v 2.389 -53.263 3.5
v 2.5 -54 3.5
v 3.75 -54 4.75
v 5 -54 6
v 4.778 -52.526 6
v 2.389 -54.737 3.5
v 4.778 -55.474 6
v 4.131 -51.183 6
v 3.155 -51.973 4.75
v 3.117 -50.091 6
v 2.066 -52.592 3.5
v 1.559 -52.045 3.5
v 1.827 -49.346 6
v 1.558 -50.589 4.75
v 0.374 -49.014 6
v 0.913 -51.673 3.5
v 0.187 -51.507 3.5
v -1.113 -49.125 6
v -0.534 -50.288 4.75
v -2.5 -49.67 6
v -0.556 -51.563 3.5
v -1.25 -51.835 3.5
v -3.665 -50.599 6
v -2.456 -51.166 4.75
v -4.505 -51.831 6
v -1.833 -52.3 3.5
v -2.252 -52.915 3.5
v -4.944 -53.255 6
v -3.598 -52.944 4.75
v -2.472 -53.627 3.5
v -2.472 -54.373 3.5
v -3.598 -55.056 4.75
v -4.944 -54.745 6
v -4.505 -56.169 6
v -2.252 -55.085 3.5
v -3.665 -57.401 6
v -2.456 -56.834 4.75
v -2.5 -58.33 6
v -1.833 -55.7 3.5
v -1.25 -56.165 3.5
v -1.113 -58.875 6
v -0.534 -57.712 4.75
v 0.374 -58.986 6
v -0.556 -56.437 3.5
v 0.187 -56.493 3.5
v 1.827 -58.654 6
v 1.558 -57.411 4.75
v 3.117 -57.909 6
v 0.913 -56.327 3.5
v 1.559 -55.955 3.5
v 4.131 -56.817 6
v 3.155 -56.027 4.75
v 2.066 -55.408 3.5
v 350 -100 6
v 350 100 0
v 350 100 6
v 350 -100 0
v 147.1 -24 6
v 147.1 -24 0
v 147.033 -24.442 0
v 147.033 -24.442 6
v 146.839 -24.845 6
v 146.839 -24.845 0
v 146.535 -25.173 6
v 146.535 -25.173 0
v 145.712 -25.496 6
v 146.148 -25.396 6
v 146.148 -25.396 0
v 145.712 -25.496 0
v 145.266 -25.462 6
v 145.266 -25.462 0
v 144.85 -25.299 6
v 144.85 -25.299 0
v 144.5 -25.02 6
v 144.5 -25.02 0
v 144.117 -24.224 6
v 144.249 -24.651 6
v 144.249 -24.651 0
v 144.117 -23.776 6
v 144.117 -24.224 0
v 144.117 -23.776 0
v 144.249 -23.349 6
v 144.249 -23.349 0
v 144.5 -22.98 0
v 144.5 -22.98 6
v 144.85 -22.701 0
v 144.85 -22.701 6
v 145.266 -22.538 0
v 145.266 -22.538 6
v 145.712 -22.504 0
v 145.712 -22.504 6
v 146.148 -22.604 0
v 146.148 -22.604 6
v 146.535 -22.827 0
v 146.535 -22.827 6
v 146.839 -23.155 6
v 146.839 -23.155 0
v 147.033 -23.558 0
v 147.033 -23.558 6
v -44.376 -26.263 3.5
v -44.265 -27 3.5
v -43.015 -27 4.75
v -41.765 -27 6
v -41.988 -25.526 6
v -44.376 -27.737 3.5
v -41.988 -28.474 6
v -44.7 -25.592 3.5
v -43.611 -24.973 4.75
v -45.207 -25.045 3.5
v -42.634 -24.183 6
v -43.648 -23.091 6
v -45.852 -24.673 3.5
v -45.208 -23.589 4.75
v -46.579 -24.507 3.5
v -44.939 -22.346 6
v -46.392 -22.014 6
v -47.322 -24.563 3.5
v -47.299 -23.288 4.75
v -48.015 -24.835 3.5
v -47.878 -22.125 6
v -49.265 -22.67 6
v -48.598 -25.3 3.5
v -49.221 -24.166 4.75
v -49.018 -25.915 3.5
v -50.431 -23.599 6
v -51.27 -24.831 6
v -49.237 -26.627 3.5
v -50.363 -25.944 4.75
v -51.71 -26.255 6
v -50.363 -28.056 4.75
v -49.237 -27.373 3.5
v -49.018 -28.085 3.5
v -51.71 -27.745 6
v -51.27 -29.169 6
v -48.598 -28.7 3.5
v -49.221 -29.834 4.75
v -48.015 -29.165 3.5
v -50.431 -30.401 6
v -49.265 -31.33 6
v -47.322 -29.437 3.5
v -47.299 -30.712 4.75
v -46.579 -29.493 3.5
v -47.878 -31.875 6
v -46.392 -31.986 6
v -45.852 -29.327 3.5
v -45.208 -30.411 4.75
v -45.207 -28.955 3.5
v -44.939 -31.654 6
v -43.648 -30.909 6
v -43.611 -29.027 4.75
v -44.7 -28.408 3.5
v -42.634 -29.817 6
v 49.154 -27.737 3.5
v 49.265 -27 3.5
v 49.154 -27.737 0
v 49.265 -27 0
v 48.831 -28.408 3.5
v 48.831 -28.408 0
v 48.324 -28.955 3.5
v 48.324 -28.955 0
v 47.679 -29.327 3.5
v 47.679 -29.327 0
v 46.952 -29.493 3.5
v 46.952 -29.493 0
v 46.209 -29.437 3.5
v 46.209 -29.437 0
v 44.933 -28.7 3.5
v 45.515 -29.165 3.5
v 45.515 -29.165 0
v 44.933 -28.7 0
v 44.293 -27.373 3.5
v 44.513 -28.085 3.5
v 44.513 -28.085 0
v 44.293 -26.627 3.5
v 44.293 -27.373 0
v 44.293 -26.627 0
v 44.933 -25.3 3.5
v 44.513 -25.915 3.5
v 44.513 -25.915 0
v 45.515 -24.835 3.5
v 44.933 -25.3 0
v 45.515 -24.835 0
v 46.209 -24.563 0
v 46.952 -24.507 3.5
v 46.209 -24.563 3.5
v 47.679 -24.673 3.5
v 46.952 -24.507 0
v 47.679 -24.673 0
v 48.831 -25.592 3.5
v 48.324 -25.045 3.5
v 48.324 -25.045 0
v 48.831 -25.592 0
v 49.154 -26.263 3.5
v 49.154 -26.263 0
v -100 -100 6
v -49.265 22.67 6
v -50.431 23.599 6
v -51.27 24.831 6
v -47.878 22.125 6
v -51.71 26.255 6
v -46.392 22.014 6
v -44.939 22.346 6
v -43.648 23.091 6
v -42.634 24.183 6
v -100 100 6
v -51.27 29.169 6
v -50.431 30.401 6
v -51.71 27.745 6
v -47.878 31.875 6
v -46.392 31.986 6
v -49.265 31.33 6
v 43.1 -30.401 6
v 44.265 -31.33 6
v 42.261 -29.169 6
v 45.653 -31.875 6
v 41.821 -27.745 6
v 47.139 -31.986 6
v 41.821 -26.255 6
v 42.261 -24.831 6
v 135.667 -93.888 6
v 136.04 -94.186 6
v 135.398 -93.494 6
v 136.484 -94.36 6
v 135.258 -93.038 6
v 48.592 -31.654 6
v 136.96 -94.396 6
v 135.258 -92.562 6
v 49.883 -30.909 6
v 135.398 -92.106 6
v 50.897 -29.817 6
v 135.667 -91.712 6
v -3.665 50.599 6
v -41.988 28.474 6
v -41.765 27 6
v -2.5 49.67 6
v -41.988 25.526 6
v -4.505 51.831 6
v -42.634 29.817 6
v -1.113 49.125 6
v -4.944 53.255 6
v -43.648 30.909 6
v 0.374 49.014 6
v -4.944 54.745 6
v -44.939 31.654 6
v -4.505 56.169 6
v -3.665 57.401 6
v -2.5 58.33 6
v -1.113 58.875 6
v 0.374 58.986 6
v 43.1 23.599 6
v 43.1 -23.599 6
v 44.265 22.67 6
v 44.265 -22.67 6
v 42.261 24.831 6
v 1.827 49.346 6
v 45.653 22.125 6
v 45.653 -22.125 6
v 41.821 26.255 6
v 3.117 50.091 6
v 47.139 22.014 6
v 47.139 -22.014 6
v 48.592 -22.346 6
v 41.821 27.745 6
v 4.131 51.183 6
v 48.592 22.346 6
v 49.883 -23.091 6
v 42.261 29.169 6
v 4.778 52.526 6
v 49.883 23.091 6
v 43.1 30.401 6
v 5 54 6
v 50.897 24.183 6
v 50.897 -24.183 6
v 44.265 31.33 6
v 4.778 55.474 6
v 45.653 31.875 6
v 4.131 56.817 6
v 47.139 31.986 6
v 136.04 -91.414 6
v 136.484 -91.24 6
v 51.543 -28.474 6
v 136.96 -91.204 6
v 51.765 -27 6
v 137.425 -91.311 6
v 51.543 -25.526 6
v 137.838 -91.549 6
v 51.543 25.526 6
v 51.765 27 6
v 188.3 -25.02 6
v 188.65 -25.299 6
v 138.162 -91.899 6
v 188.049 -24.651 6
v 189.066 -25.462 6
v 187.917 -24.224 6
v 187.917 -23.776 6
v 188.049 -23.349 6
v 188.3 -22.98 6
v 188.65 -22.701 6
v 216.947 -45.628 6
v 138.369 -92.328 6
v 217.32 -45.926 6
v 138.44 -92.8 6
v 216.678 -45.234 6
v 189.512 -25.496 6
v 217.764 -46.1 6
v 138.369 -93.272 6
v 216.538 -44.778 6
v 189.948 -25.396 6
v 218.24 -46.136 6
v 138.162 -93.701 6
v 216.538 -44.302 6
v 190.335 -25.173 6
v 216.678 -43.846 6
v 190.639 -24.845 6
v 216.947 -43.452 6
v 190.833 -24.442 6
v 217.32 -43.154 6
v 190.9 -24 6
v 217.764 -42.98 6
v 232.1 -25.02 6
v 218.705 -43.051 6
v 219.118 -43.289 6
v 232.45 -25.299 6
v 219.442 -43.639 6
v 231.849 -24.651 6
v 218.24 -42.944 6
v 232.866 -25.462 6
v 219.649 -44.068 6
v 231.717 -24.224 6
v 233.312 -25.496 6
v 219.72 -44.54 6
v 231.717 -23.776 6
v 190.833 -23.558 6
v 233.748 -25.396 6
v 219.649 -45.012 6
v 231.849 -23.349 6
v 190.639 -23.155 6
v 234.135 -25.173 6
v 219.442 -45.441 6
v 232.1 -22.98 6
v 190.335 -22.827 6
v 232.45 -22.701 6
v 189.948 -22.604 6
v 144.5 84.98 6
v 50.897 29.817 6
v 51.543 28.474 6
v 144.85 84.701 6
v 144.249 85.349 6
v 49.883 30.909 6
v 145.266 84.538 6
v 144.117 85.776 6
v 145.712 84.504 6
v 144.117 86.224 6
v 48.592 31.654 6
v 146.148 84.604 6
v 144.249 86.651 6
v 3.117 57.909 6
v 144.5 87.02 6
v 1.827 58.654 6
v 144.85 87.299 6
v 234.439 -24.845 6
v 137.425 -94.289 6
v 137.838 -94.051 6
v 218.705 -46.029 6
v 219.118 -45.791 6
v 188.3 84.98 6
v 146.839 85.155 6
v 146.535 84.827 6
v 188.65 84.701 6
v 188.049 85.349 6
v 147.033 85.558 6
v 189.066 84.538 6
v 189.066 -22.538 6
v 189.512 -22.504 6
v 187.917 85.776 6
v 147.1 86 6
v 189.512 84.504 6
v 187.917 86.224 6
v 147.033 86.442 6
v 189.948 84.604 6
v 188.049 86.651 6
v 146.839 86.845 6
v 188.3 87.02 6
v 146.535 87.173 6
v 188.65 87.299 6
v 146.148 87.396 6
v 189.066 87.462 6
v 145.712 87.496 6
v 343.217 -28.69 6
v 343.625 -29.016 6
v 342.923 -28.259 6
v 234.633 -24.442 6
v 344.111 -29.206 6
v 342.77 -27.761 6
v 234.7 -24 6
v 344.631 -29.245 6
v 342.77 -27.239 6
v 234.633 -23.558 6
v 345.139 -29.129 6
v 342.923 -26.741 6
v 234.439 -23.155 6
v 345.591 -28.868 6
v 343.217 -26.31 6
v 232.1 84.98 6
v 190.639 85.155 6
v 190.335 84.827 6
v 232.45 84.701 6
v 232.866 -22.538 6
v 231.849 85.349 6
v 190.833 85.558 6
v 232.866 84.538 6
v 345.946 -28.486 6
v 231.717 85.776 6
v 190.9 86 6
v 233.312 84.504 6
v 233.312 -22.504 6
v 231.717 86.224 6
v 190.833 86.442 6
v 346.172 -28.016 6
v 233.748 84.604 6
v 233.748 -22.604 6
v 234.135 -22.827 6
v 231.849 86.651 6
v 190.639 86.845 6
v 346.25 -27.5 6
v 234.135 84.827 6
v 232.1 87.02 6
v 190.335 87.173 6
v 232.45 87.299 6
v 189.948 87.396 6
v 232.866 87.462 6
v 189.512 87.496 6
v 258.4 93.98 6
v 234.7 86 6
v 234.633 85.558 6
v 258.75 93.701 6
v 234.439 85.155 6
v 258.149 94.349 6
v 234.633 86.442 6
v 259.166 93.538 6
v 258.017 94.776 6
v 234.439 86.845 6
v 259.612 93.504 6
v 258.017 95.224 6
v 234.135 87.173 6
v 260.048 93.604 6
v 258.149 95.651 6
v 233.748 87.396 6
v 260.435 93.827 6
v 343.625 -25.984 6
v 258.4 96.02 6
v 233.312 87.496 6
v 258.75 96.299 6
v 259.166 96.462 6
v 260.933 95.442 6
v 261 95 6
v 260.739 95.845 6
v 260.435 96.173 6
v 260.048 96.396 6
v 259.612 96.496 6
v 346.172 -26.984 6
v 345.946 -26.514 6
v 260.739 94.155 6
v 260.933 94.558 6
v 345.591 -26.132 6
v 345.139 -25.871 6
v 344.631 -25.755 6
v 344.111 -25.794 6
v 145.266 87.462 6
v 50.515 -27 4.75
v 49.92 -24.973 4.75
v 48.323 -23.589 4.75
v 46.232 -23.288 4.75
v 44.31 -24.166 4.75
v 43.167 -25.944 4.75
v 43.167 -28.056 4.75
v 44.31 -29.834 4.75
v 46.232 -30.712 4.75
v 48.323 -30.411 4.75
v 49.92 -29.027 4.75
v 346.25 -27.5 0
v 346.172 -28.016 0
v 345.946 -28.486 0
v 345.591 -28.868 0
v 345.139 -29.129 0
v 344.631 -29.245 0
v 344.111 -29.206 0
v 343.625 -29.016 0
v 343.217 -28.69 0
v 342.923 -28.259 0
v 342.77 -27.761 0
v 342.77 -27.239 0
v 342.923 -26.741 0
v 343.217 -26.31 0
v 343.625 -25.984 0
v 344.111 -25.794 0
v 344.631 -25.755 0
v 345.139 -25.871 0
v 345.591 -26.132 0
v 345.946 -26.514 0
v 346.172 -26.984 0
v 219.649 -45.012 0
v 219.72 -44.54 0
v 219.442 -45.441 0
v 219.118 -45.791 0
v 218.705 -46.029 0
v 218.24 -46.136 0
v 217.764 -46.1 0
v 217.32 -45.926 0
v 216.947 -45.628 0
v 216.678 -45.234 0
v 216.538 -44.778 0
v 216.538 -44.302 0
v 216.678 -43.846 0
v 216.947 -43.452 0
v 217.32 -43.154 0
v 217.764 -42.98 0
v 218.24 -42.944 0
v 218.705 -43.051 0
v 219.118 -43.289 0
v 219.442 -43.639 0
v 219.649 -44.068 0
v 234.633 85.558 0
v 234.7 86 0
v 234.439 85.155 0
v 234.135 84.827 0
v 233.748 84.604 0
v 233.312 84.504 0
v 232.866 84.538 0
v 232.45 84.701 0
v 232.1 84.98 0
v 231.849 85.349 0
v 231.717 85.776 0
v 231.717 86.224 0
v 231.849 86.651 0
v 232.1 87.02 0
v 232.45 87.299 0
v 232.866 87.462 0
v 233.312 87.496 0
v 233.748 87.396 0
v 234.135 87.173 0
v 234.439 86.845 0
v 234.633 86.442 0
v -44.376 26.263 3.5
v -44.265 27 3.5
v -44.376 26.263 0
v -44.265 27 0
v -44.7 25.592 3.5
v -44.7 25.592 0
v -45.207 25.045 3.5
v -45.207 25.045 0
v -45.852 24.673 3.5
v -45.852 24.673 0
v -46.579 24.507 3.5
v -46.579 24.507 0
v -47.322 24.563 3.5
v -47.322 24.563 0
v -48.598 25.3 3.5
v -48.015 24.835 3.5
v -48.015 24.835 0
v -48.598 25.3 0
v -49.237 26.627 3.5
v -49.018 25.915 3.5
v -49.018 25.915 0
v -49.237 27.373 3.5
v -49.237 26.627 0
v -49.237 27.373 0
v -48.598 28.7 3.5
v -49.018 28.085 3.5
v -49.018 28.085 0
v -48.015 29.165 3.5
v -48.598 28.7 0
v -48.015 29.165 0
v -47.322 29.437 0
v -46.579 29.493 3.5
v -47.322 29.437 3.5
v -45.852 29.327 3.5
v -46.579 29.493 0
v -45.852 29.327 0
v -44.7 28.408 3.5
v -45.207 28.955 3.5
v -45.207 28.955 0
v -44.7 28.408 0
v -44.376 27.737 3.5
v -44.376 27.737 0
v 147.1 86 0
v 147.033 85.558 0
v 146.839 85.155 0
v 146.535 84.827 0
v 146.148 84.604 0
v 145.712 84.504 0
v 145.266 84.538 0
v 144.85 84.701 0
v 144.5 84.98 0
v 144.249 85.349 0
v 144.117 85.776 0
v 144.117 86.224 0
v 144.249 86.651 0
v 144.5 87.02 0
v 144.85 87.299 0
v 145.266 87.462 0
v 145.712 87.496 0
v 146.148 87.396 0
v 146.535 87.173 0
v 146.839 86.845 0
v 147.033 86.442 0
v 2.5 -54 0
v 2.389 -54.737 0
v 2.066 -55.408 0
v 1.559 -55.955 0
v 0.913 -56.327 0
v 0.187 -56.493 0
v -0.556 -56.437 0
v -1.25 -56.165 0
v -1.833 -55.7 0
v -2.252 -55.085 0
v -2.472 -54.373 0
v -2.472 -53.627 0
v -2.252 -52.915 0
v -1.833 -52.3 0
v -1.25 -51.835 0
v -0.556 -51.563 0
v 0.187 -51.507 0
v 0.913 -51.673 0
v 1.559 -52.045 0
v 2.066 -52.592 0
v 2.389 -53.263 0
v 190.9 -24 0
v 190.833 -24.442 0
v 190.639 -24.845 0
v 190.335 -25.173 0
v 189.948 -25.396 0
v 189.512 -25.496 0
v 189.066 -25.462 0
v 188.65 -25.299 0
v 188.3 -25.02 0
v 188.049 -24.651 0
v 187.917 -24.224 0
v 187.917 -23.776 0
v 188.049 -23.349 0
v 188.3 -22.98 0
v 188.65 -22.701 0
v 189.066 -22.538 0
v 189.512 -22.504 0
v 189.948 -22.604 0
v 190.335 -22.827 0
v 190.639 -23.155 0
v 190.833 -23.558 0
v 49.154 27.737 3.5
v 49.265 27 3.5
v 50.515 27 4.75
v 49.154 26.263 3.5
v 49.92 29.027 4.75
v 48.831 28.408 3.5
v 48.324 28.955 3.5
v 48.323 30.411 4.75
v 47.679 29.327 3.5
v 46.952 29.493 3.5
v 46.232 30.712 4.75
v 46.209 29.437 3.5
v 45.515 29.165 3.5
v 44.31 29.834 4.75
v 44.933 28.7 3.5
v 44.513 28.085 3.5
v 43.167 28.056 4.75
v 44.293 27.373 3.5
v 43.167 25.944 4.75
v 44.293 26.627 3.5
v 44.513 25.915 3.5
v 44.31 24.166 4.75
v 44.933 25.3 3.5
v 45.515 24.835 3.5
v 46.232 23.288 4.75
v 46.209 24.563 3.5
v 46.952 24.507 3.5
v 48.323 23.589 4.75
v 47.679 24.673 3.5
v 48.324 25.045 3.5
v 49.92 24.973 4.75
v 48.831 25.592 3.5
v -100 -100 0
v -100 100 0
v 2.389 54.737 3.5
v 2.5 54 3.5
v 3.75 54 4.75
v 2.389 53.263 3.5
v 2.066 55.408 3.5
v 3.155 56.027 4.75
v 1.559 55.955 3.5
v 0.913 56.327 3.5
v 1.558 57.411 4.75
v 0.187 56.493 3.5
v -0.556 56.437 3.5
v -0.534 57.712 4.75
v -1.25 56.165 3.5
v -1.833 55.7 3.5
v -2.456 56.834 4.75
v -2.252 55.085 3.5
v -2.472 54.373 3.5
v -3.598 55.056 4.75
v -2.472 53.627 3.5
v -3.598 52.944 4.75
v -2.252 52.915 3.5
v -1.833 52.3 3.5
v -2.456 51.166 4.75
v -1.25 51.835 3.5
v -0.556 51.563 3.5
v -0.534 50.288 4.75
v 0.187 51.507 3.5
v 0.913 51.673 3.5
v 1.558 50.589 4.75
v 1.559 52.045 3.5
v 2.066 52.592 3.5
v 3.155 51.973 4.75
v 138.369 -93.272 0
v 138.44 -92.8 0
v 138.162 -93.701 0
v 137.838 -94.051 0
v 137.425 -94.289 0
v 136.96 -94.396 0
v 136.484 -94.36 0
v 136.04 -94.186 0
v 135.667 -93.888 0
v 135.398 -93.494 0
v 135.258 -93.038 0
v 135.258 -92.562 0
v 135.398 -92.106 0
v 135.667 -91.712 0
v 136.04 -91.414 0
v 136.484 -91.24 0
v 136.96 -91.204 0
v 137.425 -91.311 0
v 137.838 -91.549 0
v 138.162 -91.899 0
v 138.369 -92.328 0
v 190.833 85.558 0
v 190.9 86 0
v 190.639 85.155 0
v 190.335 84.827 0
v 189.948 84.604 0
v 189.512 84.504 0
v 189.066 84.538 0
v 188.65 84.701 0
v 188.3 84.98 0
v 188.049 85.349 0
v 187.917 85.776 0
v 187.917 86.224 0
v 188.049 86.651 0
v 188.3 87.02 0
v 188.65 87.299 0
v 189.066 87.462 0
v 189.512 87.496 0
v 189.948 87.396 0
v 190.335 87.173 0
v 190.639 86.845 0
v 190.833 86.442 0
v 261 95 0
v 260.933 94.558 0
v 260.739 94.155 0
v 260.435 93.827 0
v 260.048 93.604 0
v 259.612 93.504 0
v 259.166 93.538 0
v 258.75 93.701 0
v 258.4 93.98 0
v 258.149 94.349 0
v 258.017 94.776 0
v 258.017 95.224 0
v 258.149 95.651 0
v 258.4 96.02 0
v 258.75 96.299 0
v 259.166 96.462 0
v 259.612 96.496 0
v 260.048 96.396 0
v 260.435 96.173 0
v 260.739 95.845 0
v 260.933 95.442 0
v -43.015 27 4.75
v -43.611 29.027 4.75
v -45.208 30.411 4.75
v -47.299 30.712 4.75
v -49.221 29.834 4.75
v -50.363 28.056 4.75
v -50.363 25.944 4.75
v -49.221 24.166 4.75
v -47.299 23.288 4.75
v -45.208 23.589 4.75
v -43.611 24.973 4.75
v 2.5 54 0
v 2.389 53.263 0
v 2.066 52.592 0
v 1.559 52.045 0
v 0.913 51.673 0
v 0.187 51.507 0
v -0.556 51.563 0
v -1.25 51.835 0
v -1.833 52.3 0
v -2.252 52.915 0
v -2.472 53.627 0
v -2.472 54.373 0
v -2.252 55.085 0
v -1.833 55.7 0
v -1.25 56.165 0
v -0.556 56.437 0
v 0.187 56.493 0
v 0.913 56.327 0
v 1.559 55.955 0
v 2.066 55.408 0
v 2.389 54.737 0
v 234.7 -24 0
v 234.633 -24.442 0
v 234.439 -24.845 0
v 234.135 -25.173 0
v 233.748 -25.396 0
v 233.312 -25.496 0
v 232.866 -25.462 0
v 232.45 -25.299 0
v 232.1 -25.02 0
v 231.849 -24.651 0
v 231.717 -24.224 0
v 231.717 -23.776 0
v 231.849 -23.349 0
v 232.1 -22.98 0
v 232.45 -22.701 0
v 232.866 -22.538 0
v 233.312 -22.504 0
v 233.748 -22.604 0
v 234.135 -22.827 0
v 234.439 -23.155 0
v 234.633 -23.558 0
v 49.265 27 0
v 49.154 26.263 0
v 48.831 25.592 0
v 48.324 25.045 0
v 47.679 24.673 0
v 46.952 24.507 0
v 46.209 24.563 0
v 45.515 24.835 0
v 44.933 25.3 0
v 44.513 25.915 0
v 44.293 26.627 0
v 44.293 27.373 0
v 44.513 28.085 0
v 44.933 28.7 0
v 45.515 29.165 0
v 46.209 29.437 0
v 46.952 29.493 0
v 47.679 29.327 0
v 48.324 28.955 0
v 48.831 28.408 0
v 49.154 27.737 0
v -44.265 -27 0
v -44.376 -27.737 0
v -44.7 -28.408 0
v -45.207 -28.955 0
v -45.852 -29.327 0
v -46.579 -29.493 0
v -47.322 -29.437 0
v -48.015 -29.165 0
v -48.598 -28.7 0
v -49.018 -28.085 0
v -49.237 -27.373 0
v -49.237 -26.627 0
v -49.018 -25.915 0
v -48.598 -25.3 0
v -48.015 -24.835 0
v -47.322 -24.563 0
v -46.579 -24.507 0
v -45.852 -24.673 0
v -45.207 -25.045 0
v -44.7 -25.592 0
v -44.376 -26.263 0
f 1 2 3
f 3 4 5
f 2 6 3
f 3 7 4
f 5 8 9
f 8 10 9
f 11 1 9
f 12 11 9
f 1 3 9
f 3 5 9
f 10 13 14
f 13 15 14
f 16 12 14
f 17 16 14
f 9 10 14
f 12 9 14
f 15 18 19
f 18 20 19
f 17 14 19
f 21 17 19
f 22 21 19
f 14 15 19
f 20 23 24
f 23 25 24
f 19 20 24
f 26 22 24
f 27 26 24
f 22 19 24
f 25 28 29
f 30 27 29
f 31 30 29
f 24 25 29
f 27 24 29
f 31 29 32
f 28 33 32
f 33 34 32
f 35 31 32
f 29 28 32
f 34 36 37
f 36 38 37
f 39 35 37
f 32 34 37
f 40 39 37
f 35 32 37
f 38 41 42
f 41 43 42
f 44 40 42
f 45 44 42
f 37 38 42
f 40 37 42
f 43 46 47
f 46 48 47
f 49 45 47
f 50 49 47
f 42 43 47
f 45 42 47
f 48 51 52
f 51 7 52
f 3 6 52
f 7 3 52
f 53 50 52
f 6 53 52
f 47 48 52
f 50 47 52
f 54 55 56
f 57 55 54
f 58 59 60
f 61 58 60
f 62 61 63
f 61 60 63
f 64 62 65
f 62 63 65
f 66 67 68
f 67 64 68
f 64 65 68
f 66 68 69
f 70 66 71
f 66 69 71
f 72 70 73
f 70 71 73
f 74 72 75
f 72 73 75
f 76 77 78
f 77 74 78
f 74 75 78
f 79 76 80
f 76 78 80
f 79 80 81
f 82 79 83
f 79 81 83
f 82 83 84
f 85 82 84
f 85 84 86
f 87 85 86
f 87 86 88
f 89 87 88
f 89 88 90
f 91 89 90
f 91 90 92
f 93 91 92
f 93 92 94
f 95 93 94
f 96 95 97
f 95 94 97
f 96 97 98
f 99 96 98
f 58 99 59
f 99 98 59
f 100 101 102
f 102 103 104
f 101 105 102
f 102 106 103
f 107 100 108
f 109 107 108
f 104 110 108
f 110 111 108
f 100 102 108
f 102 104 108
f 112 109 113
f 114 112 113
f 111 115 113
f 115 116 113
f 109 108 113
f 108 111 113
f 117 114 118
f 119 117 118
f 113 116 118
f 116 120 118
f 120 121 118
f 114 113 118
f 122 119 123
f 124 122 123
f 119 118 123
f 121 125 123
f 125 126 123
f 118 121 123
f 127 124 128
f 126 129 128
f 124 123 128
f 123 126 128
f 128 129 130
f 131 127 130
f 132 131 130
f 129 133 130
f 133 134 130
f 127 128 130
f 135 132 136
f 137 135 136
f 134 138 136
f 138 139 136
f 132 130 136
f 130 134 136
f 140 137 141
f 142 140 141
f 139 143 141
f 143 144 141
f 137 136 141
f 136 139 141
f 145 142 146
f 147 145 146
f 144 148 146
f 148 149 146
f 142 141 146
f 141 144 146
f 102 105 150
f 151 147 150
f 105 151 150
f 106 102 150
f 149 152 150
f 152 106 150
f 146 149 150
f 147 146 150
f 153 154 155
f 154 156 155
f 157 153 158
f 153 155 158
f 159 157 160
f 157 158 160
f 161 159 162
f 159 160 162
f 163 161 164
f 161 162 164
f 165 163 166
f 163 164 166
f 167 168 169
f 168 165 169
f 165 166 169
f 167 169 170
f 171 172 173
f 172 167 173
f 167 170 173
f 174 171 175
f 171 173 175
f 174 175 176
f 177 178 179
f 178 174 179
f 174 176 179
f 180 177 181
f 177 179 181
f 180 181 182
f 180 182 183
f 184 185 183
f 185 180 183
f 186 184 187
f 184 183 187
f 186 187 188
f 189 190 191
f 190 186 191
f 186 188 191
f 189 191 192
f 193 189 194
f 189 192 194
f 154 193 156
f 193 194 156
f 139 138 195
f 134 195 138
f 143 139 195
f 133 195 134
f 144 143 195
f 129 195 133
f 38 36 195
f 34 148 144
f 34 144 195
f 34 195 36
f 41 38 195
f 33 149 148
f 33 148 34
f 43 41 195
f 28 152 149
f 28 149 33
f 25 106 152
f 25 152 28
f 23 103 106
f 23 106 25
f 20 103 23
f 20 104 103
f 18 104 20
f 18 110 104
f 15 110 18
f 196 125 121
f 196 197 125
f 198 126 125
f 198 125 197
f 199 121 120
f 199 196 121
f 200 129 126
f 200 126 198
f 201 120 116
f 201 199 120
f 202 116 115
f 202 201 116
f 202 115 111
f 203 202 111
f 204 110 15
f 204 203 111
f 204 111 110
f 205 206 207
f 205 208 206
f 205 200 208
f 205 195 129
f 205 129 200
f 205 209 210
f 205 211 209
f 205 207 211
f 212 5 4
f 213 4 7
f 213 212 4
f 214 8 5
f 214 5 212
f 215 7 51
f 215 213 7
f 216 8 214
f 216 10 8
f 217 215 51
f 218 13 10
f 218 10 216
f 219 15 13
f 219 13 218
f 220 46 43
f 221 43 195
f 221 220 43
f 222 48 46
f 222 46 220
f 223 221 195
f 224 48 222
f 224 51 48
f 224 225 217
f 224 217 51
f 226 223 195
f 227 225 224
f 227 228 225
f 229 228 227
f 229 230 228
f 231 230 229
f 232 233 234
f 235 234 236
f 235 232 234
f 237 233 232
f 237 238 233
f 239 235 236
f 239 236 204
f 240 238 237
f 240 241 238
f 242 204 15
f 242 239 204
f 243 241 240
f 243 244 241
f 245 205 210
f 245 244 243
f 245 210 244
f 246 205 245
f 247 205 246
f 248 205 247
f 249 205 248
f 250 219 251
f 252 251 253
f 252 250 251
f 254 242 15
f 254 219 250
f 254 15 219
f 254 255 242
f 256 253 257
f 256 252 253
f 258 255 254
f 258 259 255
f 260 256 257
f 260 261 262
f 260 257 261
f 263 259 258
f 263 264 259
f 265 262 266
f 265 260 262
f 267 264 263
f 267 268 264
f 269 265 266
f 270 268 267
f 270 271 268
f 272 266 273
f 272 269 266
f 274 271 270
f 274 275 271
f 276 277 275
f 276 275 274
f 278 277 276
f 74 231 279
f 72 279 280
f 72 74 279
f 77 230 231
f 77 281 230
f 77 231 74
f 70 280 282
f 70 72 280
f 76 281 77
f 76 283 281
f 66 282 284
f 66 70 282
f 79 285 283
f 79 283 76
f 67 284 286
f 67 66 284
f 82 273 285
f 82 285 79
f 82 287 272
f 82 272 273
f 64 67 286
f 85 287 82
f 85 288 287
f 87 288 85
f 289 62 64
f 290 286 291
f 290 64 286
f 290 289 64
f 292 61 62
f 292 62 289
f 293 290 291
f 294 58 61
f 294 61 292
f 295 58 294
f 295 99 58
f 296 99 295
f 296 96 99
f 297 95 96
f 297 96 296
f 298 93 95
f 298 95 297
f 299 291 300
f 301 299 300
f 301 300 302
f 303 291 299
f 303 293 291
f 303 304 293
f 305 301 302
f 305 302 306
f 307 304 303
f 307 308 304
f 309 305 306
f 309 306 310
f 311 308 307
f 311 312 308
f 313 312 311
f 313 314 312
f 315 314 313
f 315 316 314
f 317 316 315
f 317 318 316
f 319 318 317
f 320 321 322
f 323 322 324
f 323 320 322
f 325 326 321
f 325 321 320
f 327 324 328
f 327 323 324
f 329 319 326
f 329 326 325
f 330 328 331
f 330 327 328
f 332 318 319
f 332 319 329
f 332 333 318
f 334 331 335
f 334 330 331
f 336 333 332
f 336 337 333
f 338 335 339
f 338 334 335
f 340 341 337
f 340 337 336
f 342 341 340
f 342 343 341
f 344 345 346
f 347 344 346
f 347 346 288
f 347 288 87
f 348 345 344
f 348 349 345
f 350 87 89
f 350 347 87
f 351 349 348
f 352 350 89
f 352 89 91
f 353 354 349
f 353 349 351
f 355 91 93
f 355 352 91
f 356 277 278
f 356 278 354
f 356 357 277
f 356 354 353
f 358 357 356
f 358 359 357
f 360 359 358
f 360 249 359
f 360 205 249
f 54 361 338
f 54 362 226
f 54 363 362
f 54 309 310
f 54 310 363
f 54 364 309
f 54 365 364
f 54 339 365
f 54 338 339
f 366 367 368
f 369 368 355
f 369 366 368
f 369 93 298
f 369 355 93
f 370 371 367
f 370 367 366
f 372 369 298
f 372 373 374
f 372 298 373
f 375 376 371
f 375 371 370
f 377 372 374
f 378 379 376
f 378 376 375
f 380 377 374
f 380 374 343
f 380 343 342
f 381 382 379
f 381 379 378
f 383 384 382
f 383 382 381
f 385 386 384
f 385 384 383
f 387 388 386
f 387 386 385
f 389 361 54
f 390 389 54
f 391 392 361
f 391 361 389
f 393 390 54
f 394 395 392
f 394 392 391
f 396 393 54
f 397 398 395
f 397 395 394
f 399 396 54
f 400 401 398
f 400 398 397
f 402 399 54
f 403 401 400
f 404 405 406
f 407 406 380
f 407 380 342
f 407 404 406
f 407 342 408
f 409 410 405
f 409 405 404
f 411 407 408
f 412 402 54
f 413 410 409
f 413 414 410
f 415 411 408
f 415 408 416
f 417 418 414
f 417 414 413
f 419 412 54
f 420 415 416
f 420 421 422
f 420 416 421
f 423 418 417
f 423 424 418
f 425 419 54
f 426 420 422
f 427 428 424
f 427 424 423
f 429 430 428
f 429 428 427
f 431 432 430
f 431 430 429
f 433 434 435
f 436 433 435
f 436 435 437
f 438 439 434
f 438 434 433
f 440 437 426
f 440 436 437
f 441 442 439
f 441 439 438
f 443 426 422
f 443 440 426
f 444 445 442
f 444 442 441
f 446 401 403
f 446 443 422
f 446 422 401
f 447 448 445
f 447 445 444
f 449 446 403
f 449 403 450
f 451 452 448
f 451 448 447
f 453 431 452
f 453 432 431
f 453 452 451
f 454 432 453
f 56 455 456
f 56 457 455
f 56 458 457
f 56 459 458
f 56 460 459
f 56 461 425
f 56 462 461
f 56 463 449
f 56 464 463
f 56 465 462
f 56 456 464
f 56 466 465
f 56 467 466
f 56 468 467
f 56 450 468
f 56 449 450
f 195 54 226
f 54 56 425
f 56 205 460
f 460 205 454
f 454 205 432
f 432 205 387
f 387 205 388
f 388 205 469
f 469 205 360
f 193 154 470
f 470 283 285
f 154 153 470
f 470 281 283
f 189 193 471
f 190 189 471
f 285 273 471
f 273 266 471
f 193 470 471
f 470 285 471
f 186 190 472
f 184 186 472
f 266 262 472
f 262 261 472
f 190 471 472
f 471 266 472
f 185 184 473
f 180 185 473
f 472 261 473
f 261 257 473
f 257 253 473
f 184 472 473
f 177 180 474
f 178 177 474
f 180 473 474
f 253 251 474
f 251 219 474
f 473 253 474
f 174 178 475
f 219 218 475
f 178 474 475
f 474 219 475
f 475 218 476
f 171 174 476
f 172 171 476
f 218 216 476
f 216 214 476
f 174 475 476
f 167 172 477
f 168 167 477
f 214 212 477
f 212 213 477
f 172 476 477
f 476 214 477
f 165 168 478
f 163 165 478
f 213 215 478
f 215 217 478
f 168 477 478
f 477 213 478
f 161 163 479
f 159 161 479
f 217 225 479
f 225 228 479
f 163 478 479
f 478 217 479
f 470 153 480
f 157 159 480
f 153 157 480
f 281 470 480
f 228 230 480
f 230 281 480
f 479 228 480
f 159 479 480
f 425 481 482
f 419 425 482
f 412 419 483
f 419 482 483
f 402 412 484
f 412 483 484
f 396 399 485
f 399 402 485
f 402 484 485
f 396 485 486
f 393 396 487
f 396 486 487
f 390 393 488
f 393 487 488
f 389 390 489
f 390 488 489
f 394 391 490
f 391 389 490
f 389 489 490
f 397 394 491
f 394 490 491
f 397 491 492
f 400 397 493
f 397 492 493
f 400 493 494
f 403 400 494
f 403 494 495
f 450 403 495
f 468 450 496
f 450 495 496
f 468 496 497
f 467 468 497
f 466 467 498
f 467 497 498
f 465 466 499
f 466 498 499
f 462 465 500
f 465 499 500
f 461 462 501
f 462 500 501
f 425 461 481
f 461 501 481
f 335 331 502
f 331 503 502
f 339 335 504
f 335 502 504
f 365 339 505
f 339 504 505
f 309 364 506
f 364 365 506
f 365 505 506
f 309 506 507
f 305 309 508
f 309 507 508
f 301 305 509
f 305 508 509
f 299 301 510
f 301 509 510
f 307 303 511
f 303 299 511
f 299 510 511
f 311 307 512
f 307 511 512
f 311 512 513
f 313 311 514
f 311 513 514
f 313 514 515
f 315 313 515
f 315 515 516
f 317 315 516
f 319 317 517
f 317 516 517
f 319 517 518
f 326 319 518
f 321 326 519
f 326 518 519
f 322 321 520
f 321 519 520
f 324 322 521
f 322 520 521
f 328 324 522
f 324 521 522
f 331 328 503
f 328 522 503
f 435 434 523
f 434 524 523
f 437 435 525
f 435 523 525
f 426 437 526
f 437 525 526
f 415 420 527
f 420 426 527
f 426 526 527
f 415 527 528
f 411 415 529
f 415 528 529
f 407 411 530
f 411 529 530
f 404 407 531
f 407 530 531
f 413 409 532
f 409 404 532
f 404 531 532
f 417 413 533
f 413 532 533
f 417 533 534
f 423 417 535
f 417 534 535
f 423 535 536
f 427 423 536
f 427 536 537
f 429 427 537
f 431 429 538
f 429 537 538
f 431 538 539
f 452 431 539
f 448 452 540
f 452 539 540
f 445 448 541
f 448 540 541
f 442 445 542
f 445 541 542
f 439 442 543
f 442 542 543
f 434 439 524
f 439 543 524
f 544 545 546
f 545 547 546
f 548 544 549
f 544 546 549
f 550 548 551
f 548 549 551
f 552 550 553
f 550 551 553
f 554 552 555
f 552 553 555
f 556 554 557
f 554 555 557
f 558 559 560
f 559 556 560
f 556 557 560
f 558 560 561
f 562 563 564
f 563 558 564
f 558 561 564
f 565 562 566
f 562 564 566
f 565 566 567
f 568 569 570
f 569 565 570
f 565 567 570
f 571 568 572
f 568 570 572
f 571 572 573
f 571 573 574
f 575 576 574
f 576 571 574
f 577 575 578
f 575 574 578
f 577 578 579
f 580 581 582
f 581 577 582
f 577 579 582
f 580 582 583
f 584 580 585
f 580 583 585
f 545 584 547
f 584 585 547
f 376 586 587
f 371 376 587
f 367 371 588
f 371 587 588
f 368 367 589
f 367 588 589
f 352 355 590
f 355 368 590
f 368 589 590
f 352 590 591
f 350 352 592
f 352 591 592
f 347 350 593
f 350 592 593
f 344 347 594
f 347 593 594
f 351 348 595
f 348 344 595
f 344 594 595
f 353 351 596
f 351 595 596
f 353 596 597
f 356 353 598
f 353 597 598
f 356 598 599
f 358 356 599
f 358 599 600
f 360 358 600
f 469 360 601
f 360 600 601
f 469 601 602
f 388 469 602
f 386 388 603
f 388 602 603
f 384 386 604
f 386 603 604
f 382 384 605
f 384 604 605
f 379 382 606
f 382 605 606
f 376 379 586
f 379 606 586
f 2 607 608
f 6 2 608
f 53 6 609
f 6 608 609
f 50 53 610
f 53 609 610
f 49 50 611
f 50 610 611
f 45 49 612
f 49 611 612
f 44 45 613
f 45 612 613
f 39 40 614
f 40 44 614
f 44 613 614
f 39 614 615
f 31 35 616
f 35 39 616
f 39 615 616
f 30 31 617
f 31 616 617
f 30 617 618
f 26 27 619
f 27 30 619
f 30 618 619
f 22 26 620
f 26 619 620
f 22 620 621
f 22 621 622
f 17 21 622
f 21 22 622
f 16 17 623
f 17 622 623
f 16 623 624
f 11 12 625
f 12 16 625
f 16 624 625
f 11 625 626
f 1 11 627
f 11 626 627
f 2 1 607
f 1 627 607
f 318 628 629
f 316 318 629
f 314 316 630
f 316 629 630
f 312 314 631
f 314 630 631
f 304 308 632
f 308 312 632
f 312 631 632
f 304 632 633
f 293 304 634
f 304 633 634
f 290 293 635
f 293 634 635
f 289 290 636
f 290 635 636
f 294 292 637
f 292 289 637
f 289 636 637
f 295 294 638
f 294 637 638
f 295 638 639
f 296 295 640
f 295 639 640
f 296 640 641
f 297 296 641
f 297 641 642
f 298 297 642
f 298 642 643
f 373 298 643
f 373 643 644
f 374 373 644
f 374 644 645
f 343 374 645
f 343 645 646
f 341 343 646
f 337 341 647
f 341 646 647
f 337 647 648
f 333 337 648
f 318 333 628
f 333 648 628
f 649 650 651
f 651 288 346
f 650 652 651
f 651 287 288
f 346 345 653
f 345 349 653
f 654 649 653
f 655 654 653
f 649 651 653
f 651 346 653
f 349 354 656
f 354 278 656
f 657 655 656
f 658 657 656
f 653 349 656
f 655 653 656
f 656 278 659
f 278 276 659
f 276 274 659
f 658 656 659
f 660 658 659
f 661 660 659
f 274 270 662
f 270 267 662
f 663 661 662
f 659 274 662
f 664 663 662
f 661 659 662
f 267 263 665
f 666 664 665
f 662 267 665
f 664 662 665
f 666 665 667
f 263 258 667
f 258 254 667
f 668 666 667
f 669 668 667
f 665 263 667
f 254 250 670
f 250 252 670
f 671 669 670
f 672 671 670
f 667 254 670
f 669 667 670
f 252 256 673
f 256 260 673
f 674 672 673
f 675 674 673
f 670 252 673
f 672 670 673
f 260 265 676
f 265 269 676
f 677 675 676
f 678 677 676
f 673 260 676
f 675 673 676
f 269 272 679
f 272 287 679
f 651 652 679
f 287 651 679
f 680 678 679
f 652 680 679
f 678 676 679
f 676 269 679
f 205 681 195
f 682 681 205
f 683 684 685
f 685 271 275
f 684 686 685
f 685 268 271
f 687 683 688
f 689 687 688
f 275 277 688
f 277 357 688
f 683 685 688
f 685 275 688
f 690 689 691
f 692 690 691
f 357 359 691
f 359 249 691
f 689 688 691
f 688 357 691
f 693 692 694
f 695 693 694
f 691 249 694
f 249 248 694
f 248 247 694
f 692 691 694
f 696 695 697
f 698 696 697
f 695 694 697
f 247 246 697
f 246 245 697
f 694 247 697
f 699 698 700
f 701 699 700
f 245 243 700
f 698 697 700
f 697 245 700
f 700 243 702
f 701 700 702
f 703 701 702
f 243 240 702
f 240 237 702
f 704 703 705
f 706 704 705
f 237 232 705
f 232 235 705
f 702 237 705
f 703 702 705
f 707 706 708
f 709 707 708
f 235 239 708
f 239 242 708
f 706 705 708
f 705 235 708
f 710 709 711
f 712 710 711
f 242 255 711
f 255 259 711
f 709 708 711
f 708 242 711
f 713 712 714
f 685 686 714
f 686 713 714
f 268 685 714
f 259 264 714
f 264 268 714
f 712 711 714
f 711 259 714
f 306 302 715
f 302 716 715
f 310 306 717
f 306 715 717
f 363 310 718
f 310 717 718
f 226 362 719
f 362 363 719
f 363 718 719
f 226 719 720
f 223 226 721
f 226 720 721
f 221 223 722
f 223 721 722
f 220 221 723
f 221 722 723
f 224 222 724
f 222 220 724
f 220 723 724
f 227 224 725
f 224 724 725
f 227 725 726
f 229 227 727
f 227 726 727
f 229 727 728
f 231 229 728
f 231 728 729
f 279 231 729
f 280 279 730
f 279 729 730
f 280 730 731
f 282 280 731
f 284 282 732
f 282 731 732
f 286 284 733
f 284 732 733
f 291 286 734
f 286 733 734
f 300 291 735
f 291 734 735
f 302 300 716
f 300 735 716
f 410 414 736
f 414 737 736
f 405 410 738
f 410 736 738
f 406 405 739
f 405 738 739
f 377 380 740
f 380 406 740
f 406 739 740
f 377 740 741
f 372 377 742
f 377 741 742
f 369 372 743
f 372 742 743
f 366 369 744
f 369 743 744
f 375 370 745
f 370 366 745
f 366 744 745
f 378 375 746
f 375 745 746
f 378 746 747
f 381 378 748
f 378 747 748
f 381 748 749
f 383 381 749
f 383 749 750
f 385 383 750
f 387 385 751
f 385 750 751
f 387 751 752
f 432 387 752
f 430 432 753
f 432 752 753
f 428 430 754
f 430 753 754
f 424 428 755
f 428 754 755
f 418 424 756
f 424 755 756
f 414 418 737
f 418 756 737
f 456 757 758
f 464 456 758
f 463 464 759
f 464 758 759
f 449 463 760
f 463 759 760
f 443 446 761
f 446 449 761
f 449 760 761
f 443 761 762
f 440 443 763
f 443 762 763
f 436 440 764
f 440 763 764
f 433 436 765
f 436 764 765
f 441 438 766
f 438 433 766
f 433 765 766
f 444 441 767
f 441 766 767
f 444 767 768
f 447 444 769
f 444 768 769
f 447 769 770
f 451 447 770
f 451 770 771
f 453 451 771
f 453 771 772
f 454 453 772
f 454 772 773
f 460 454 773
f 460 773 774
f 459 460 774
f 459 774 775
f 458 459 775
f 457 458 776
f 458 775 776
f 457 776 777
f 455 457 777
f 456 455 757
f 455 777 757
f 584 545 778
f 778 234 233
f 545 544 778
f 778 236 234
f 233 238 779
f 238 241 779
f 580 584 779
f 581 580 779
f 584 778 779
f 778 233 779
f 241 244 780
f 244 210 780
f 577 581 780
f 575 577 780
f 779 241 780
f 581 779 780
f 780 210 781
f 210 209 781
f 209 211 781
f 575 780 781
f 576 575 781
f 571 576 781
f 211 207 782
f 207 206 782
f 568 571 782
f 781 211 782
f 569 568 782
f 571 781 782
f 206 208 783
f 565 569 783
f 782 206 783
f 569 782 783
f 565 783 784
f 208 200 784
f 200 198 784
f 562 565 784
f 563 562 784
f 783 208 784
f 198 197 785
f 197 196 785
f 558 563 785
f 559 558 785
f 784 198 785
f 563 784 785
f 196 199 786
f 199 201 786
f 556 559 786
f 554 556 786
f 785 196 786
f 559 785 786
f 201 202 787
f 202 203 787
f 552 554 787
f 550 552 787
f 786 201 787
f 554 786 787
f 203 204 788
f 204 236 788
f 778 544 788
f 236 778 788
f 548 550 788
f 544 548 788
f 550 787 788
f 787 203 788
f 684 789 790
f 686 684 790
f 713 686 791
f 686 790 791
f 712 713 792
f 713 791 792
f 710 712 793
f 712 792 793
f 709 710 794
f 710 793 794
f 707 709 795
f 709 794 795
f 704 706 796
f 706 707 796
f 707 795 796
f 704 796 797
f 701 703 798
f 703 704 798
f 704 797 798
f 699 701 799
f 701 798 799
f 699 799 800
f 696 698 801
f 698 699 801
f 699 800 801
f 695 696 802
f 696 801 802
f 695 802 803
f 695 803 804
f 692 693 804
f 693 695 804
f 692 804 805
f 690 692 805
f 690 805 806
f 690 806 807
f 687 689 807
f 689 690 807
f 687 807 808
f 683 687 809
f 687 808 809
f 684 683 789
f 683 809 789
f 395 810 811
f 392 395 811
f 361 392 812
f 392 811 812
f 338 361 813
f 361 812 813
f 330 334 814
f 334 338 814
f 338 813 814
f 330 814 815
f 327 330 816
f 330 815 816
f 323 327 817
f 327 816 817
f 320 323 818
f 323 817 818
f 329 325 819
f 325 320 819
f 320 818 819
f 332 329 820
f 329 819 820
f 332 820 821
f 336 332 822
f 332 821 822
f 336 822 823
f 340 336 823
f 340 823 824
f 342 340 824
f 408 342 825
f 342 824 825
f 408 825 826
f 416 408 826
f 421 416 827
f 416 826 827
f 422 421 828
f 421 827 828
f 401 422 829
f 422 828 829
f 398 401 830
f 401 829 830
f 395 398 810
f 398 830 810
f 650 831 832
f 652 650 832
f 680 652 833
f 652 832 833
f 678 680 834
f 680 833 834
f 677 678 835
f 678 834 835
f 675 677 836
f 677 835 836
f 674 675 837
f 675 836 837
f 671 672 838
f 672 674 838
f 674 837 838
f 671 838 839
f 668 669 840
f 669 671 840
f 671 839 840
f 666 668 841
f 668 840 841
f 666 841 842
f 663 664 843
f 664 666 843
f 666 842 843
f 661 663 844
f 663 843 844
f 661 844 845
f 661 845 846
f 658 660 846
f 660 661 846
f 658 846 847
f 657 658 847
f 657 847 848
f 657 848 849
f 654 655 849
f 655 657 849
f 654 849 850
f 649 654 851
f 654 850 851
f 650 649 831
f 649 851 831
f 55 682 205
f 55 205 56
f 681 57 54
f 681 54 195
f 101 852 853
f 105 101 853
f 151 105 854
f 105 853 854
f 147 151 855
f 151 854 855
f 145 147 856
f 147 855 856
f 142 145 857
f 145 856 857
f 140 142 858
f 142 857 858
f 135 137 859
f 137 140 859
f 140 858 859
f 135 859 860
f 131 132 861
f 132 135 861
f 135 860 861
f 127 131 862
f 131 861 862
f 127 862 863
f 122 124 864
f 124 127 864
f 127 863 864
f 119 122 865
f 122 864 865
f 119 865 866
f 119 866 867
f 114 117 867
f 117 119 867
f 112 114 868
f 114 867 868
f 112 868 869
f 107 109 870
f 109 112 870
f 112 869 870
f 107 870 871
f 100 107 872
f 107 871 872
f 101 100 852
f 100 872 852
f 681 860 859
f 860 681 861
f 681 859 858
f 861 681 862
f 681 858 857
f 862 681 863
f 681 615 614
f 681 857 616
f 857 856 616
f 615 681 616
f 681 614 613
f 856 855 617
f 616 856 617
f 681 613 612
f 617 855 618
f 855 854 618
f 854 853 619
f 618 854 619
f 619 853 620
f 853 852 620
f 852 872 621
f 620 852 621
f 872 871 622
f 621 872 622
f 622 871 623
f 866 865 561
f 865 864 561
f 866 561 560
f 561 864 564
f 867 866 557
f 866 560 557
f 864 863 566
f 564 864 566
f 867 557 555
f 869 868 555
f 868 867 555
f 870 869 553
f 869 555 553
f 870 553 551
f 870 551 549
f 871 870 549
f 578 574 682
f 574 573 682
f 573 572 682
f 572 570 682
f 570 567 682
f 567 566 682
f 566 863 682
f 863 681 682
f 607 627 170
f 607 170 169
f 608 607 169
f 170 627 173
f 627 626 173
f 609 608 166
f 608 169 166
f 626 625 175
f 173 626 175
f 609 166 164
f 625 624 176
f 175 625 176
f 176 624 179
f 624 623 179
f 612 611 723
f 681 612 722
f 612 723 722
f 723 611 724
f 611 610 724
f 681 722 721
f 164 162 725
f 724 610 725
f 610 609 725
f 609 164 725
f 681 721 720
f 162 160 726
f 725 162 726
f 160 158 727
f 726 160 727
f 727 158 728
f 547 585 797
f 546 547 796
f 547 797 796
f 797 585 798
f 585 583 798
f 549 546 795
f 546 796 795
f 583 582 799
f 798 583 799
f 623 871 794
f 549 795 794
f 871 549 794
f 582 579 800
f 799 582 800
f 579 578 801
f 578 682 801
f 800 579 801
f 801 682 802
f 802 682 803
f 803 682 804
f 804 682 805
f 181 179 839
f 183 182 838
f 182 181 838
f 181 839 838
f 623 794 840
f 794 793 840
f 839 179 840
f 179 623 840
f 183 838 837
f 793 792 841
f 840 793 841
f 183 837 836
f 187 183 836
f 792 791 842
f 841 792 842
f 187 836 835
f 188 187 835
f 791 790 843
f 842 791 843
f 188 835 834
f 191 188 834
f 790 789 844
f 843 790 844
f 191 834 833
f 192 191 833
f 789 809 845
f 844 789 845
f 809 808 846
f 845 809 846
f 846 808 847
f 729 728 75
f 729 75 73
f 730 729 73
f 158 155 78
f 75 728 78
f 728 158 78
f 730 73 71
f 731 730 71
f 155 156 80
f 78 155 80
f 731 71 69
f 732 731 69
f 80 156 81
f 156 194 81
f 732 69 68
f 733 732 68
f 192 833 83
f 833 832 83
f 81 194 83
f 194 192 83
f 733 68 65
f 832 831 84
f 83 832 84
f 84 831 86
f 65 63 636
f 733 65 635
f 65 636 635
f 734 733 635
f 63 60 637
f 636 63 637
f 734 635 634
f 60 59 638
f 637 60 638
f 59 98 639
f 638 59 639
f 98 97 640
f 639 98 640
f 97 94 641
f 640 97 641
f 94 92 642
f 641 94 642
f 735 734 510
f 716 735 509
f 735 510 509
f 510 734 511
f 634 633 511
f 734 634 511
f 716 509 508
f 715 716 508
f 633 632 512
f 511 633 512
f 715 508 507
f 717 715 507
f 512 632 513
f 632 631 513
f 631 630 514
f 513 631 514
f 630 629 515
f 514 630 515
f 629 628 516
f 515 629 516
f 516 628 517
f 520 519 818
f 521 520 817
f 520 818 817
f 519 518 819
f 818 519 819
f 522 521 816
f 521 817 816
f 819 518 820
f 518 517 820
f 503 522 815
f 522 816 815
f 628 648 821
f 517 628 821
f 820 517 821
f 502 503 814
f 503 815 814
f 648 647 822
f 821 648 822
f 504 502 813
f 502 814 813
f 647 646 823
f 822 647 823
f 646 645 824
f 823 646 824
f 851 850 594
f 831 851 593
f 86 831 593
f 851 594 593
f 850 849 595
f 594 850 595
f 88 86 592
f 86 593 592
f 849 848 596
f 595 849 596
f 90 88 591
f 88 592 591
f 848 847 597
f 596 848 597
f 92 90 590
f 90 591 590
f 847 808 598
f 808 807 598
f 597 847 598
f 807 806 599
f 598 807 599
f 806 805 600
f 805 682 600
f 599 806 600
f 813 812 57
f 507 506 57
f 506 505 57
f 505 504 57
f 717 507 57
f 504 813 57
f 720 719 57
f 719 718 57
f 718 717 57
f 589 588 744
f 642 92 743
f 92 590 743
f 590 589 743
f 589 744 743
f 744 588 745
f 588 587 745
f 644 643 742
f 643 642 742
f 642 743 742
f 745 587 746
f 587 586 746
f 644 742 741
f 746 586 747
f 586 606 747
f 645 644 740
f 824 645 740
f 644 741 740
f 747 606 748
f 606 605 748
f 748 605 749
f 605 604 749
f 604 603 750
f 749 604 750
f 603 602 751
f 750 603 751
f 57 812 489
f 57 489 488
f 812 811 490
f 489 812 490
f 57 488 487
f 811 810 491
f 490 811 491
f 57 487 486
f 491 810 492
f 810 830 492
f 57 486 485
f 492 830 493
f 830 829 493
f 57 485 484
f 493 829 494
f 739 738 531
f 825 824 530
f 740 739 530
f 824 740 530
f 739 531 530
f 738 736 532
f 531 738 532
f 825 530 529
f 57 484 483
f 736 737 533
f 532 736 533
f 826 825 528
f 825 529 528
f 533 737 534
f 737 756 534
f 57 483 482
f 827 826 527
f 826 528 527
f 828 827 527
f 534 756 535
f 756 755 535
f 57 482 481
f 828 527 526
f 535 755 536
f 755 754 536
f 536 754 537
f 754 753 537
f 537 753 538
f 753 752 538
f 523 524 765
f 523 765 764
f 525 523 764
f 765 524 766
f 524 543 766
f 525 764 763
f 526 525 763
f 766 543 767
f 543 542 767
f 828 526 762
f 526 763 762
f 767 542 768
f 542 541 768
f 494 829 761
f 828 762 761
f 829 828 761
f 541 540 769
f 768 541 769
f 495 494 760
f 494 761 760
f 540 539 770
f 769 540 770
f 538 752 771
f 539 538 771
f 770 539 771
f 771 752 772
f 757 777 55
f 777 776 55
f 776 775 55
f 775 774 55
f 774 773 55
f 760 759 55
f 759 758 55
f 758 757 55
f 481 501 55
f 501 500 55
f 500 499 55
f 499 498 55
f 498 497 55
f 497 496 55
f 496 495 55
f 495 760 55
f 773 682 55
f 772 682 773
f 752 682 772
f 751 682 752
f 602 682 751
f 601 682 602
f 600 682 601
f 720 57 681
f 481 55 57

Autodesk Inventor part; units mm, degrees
ref_plane "YZ Plane" through (0, 0, 0) normal (1, 0, 0) x (0, 1, 0)
ref_plane "XZ Plane" through (0, 0, 0) normal (0, 1, 0) x (-1, 0, 0)
ref_plane "XY Plane" through (0, 0, 0) normal (0, 0, 1) x (1, 0, 0)
sketch "草圖1" plane through (0, 0, 0) normal (0, 0, 1) x (1, 0, 0)
  circle A0 centre (0, 0) radius 60 construction
  circle A1 centre (0, 0) radius 48 construction
  line L0 (350, -100) -> (-100, -100)
  line L1 (-100, -100) -> (-100, 100)
  line L2 (-100, 100) -> (350, 100)
  line L3 (350, 100) -> (350, -100)
  circle A2 centre (0, 54) radius 2.5
  circle A3 centre (-46.7654, 27) radius 2.5
  circle A4 centre (-46.7654, -27) radius 2.5
  circle A5 centre (0, -54) radius 2.5
  circle A6 centre (46.7654, -27) radius 2.5
  circle A7 centre (46.7654, 27) radius 2.5
  circle A8 centre (218.12, -44.54) radius 1.6 projected
  circle A9 centre (136.84, -92.8) radius 1.6 projected
  arc A10 (147.6, -24) -> (143.6, -24) centre (145.6, -24) ccw projected
  arc A11 (191.4, -24) -> (187.4, -24) centre (189.4, -24) ccw projected
  arc A12 (143.6, 86) -> (147.6, 86) centre (145.6, 86) ccw projected
  arc A13 (187.4, 86) -> (191.4, 86) centre (189.4, 86) ccw projected
  arc A14 (231.2, 86) -> (235.2, 86) centre (233.2, 86) ccw projected
  arc A15 (235.2, -24) -> (231.2, -24) centre (233.2, -24) ccw projected
  circle A16 centre (344.5, -27.5) radius 1.75 projected
  arc A17 (257.75, 95) -> (261.25, 95) centre (259.5, 95) ccw projected
  circle A18 centre (259.5, 95) radius 1.5
  circle A19 centre (233.2, 86) radius 1.5
  circle A20 centre (189.4, 86) radius 1.5
  circle A21 centre (145.6, 86) radius 1.5
  circle A22 centre (145.6, -24) radius 1.5
  circle A23 centre (189.4, -24) radius 1.5
  circle A24 centre (233.2, -24) radius 1.5
  circle A25 centre (218.12, -44.54) radius 1.5
  circle A26 centre (136.84, -92.8) radius 1.5
  circle A27 centre (344.5, -27.5) radius 1.5
  circle A28 centre (0, -54) radius 3.275 projected
  circle A29 centre (0, 54) radius 3.275 projected
  circle A30 centre (46.7654, -27) radius 3.275 projected
  circle A31 centre (-46.7654, -27) radius 3.275 projected
  circle A32 centre (-46.7654, 27) radius 3.275 projected
  circle A33 centre (46.7654, 27) radius 3.275 projected
  point P0 (0, 0)
  dimension "d0" = 450
  dimension "d1" = 200
  dimension "d2" = 100
  dimension "d3" = 100
  dimension "d6" = 5
  dimension "d9" = 360
  dimension "d14" = 3
  dimension "d15" = 3
  dimension "d16" = 3
  dimension "d17" = 3
  dimension "d18" = 3
  dimension "d19" = 3
  dimension "d20" = 3
  dimension "d21" = 3
  dimension "d22" = 3
  dimension "d23" = 3
extrude "擠出1" add sketch "草圖1" along normal blind 6 contours L0 L1 L2 L3 | A28 | A29 | A30 | A31 | A32 | A33
chamfer "倒角1" distance 2.5 angle 45 6 edges at (-2.5, -54, 6) (-49.2654, -27, 6) (-49.2654, 27, 6) (-2.5, 54, 6) (44.2654, 27, 6) (44.2654, -27, 6)
sketch "草圖2" plane through (0, 0, 0) normal (0, 0, -1) x (-1, 0, 0)
  line L0 (-350, 100) -> (100, 100) projected
  line L1 (-350, -100) -> (-350, 100) projected
  line L2 (100, -100) -> (-350, -100) projected
  line L3 (100, 100) -> (100, -100) projected
  circle A0 centre (0, 54) radius 2.5 projected
  circle A1 centre (46.7654, 27) radius 2.5 projected
  circle A2 centre (46.7654, -27) radius 2.5 projected
  circle A3 centre (0, -54) radius 2.5 projected
  circle A4 centre (-46.7654, -27) radius 2.5 projected
  circle A5 centre (-46.7654, 27) radius 2.5 projected
  circle A6 centre (-233.2, -24) radius 1.5 projected
  circle A7 centre (-189.4, -24) radius 1.5 projected
  circle A8 centre (-145.6, -24) radius 1.5 projected
  circle A9 centre (-145.6, 86) radius 1.5 projected
  circle A10 centre (-189.4, 86) radius 1.5 projected
  circle A11 centre (-233.2, 86) radius 1.5 projected
  circle A12 centre (-259.5, 95) radius 1.5 projected
  circle A13 centre (-344.5, -27.5) radius 1.75 projected
  circle A14 centre (-136.84, -92.8) radius 1.6 projected
  circle A15 centre (-218.12, -44.54) radius 1.6 projected
  point P0 (0, 0)
properties part number "base plate"
